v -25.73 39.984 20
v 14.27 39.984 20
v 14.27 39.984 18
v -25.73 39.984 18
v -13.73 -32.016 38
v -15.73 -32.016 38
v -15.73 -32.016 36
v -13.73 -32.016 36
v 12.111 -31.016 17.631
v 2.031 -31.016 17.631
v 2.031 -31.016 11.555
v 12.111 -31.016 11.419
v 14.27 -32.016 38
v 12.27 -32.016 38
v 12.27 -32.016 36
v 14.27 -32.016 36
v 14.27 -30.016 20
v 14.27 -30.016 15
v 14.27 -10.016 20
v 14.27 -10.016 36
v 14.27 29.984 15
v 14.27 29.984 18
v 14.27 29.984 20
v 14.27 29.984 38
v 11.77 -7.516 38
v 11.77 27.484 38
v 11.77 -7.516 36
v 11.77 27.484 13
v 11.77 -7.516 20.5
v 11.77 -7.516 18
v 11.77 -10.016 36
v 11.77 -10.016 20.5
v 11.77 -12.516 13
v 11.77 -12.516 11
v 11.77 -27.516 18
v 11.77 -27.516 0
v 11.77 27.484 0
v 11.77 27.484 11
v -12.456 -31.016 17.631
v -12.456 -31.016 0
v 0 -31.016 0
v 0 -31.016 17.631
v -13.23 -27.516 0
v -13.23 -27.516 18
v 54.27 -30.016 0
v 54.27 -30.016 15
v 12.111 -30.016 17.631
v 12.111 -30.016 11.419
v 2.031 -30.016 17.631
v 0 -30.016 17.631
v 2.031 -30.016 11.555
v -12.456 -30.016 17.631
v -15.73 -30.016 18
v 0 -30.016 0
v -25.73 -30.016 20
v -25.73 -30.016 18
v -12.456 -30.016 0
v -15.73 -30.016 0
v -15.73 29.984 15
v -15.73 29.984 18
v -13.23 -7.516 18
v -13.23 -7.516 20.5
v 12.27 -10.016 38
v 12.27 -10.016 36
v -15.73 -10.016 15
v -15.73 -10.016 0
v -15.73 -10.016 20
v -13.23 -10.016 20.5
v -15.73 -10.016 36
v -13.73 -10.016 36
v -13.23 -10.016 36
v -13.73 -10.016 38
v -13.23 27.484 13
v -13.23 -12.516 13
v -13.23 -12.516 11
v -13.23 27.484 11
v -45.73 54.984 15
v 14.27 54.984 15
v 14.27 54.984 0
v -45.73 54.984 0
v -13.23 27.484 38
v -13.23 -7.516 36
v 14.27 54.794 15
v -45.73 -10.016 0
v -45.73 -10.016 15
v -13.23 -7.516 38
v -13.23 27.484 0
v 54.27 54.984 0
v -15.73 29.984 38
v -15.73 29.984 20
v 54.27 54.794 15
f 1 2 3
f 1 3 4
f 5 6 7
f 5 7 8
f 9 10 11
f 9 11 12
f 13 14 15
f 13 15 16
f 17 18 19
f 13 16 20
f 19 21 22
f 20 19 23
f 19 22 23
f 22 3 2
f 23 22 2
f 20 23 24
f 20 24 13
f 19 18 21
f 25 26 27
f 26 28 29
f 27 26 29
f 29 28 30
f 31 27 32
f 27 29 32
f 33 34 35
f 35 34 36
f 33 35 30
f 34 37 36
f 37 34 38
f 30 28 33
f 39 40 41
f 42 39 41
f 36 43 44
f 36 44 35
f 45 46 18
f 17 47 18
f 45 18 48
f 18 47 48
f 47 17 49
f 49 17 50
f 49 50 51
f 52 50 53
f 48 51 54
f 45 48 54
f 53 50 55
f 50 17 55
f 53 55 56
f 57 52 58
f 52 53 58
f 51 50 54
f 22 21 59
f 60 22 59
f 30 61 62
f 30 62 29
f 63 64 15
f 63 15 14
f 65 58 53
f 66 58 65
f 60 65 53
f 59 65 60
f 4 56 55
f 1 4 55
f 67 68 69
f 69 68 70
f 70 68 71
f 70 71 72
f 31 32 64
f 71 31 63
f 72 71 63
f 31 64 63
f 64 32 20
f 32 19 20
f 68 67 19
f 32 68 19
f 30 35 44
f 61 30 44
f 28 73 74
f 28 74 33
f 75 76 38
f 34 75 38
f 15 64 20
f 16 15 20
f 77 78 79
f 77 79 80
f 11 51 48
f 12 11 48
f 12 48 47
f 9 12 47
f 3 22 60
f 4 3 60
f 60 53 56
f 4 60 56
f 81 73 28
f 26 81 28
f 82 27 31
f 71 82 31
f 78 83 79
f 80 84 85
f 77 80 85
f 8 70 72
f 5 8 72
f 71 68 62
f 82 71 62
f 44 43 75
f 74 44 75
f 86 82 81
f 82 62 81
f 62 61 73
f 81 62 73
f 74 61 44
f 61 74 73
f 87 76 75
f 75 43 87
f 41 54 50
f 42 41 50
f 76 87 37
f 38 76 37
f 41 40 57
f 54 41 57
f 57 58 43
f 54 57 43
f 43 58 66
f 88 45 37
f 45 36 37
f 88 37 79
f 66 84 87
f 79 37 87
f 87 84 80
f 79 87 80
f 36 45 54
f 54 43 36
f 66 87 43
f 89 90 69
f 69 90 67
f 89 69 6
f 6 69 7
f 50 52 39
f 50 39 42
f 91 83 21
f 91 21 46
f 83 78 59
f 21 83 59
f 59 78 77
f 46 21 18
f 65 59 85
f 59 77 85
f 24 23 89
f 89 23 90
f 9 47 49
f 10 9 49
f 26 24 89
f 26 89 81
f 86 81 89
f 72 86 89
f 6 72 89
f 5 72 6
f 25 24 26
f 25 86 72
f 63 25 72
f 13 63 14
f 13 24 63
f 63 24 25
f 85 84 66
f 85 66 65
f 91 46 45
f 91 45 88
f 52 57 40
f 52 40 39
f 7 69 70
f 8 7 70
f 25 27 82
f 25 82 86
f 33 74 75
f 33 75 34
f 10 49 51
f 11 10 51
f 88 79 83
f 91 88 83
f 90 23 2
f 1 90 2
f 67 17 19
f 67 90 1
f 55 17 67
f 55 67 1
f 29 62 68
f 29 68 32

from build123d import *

# Parameters (mm, degrees)
F0_W      = 30
F0_H      = 60
F0_W_2    = 25
F0_H_2    = 55
F1_DEPTH  = 20
F2_W      = 40
F2_H      = 15
F3_DEPTH  = 30
F5_W      = 60
F5_H      = 2
F6_DEPTH  = 10
F8_DEPTH  = 18
F10_DEPTH = 25
F12_DEPTH = 10
F13_W     = 25
F13_H     = 2
F14_DEPTH = 20
F15_W     = 25
F15_H     = 2
F16_DEPTH = 40
F18_DEPTH = 40
F4_W      = 12.4563146383
F4_H      = 17.6308546215
F19_DEPTH = 1
F20_W     = 25
F20_H     = 2.5
F21_DEPTH = 0.5
F22_W     = 2
F22_H     = 2
F23_DEPTH = 22
F26_W     = 2.5
F26_H     = 2
F27_DEPTH = 25


# Not quite as in the source:
# - the program builds the solid bodies; features that only make, move or delete a surface that nothing else refers to are left out


with BuildPart() as f1:
    # F0 (on Top) → F1 (new body)
    with BuildSketch(Plane.XY):
        with Locations((-0.72979182, -0.0160729922)):
            Rectangle(F0_W, F0_H)
        with Locations((-0.72979182, -0.0160729922)):
            Rectangle(F0_W_2, F0_H_2, mode=Mode.SUBTRACT)
    extrude(amount=F1_DEPTH)

    # F2 (on face) → F3 (join)
    with BuildSketch(Plane(origin=(-15.72979182, 0, 0), x_dir=(0, -1, 0), z_dir=(-1, 0, 0))):
        with Locations((-9.9839270078, 7.5)):
            Rectangle(F2_W, F2_H)
    extrude(amount=F3_DEPTH)

    # F5 (on face) → F6 (join)
    with BuildSketch(Plane(origin=(-15.72979182, 0, 0), x_dir=(0, -1, 0), z_dir=(-1, 0, 0))):
        with Locations((0.0160729922, 19)):
            Rectangle(F5_W, F5_H)
    extrude(amount=F6_DEPTH)

    # F7 (on face) → F8 (join)
    with BuildSketch(Plane.XY.offset(20)):
        Polygon((14.27020818, -10.0160729922), (14.27020818, 29.9839270078), (-15.72979182, 29.9839270078), (-15.72979182, -10.0160729922), (-13.22979182, -10.0160729922), (-13.22979182, 27.4839270078), (11.77020818, 27.4839270078), (11.77020818, -10.0160729922), align=None)
    extrude(amount=F8_DEPTH)

    # F9 (on face) → F10 (join)
    with BuildSketch(Plane(origin=(0, 29.9839270078, 0), x_dir=(-1, 0, 0), z_dir=(0, 1, 0))):
        Polygon((45.72979182, 0), (45.72979182, 15), (15.72979182, 15), (-14.27020818, 15), (-14.27020818, 0), align=None)
    extrude(amount=F10_DEPTH)

    # F11 (on face) → F12 (join)
    with BuildSketch(Plane(origin=(0, 29.9839270078, 0), x_dir=(-1, 0, 0), z_dir=(0, 1, 0))):
        Polygon((25.72979182, 18), (25.72979182, 20), (15.72979182, 20), (-14.27020818, 20), (-14.27020818, 18), (15.72979182, 18), align=None)
    extrude(amount=F12_DEPTH)

    # F13 (on face) → F14 (join)
    with BuildSketch(Plane(origin=(0, -27.5160729922, 0), x_dir=(-1, 0, 0), z_dir=(0, 1, 0))):
        with Locations((0.72979182, 19)):
            Rectangle(F13_W, F13_H)
    extrude(amount=F14_DEPTH)

    # F15 (on face) → F16 (join)
    with BuildSketch(Plane.XZ.offset(-27.4839270078)):
        with Locations((-0.72979182, 12)):
            Rectangle(F15_W, F15_H)
    extrude(amount=F16_DEPTH)

    # F17 (on face) → F18 (join)
    with BuildSketch(Plane.YZ.offset(14.27020818)):
        Polygon((54.7944166925, 15), (29.9839270078, 15), (-30.0160729922, 15), (-30.0160729922, 0), (54.9839270078, 0), align=None)
    extrude(amount=F18_DEPTH)

    # F4 (on face) → F19 (join)
    with BuildSketch(Plane.XZ.offset(30.0160729922)):
        with Locations((-6.2281573191, 8.8154273108)):
            Rectangle(F4_W, F4_H)
        Polygon((12.1112056077, 11.4192906767), (12.1112056077, 17.6308546215), (2.0312797278, 17.6308546215), (2.0312797278, 11.5545932204), align=None)
    extrude(amount=F19_DEPTH)

    # F20 (on face) → F21 (join)
    with BuildSketch(Plane.XY.offset(20)):
        with Locations((-0.72979182, -8.7660729922)):
            Rectangle(F20_W, F20_H)
    extrude(amount=F21_DEPTH)

    # F22 (on face) → F23 (join)
    with BuildSketch(Plane.XZ.offset(10.0160729922)):
        with Locations((13.27020818, 37)):
            Rectangle(F22_W, F22_H)
        with Locations((-14.72979182, 37)):
            Rectangle(F22_W, F22_H)
    extrude(amount=F23_DEPTH)

    # F26 (on face) → F27 (join)
    with BuildSketch(Plane(origin=(11.77020818, 0, 0), x_dir=(0, -1, 0), z_dir=(-1, 0, 0))):
        with Locations((8.7660729922, 37)):
            Rectangle(F26_W, F26_H)
    extrude(amount=F27_DEPTH)


solid = f1.part
